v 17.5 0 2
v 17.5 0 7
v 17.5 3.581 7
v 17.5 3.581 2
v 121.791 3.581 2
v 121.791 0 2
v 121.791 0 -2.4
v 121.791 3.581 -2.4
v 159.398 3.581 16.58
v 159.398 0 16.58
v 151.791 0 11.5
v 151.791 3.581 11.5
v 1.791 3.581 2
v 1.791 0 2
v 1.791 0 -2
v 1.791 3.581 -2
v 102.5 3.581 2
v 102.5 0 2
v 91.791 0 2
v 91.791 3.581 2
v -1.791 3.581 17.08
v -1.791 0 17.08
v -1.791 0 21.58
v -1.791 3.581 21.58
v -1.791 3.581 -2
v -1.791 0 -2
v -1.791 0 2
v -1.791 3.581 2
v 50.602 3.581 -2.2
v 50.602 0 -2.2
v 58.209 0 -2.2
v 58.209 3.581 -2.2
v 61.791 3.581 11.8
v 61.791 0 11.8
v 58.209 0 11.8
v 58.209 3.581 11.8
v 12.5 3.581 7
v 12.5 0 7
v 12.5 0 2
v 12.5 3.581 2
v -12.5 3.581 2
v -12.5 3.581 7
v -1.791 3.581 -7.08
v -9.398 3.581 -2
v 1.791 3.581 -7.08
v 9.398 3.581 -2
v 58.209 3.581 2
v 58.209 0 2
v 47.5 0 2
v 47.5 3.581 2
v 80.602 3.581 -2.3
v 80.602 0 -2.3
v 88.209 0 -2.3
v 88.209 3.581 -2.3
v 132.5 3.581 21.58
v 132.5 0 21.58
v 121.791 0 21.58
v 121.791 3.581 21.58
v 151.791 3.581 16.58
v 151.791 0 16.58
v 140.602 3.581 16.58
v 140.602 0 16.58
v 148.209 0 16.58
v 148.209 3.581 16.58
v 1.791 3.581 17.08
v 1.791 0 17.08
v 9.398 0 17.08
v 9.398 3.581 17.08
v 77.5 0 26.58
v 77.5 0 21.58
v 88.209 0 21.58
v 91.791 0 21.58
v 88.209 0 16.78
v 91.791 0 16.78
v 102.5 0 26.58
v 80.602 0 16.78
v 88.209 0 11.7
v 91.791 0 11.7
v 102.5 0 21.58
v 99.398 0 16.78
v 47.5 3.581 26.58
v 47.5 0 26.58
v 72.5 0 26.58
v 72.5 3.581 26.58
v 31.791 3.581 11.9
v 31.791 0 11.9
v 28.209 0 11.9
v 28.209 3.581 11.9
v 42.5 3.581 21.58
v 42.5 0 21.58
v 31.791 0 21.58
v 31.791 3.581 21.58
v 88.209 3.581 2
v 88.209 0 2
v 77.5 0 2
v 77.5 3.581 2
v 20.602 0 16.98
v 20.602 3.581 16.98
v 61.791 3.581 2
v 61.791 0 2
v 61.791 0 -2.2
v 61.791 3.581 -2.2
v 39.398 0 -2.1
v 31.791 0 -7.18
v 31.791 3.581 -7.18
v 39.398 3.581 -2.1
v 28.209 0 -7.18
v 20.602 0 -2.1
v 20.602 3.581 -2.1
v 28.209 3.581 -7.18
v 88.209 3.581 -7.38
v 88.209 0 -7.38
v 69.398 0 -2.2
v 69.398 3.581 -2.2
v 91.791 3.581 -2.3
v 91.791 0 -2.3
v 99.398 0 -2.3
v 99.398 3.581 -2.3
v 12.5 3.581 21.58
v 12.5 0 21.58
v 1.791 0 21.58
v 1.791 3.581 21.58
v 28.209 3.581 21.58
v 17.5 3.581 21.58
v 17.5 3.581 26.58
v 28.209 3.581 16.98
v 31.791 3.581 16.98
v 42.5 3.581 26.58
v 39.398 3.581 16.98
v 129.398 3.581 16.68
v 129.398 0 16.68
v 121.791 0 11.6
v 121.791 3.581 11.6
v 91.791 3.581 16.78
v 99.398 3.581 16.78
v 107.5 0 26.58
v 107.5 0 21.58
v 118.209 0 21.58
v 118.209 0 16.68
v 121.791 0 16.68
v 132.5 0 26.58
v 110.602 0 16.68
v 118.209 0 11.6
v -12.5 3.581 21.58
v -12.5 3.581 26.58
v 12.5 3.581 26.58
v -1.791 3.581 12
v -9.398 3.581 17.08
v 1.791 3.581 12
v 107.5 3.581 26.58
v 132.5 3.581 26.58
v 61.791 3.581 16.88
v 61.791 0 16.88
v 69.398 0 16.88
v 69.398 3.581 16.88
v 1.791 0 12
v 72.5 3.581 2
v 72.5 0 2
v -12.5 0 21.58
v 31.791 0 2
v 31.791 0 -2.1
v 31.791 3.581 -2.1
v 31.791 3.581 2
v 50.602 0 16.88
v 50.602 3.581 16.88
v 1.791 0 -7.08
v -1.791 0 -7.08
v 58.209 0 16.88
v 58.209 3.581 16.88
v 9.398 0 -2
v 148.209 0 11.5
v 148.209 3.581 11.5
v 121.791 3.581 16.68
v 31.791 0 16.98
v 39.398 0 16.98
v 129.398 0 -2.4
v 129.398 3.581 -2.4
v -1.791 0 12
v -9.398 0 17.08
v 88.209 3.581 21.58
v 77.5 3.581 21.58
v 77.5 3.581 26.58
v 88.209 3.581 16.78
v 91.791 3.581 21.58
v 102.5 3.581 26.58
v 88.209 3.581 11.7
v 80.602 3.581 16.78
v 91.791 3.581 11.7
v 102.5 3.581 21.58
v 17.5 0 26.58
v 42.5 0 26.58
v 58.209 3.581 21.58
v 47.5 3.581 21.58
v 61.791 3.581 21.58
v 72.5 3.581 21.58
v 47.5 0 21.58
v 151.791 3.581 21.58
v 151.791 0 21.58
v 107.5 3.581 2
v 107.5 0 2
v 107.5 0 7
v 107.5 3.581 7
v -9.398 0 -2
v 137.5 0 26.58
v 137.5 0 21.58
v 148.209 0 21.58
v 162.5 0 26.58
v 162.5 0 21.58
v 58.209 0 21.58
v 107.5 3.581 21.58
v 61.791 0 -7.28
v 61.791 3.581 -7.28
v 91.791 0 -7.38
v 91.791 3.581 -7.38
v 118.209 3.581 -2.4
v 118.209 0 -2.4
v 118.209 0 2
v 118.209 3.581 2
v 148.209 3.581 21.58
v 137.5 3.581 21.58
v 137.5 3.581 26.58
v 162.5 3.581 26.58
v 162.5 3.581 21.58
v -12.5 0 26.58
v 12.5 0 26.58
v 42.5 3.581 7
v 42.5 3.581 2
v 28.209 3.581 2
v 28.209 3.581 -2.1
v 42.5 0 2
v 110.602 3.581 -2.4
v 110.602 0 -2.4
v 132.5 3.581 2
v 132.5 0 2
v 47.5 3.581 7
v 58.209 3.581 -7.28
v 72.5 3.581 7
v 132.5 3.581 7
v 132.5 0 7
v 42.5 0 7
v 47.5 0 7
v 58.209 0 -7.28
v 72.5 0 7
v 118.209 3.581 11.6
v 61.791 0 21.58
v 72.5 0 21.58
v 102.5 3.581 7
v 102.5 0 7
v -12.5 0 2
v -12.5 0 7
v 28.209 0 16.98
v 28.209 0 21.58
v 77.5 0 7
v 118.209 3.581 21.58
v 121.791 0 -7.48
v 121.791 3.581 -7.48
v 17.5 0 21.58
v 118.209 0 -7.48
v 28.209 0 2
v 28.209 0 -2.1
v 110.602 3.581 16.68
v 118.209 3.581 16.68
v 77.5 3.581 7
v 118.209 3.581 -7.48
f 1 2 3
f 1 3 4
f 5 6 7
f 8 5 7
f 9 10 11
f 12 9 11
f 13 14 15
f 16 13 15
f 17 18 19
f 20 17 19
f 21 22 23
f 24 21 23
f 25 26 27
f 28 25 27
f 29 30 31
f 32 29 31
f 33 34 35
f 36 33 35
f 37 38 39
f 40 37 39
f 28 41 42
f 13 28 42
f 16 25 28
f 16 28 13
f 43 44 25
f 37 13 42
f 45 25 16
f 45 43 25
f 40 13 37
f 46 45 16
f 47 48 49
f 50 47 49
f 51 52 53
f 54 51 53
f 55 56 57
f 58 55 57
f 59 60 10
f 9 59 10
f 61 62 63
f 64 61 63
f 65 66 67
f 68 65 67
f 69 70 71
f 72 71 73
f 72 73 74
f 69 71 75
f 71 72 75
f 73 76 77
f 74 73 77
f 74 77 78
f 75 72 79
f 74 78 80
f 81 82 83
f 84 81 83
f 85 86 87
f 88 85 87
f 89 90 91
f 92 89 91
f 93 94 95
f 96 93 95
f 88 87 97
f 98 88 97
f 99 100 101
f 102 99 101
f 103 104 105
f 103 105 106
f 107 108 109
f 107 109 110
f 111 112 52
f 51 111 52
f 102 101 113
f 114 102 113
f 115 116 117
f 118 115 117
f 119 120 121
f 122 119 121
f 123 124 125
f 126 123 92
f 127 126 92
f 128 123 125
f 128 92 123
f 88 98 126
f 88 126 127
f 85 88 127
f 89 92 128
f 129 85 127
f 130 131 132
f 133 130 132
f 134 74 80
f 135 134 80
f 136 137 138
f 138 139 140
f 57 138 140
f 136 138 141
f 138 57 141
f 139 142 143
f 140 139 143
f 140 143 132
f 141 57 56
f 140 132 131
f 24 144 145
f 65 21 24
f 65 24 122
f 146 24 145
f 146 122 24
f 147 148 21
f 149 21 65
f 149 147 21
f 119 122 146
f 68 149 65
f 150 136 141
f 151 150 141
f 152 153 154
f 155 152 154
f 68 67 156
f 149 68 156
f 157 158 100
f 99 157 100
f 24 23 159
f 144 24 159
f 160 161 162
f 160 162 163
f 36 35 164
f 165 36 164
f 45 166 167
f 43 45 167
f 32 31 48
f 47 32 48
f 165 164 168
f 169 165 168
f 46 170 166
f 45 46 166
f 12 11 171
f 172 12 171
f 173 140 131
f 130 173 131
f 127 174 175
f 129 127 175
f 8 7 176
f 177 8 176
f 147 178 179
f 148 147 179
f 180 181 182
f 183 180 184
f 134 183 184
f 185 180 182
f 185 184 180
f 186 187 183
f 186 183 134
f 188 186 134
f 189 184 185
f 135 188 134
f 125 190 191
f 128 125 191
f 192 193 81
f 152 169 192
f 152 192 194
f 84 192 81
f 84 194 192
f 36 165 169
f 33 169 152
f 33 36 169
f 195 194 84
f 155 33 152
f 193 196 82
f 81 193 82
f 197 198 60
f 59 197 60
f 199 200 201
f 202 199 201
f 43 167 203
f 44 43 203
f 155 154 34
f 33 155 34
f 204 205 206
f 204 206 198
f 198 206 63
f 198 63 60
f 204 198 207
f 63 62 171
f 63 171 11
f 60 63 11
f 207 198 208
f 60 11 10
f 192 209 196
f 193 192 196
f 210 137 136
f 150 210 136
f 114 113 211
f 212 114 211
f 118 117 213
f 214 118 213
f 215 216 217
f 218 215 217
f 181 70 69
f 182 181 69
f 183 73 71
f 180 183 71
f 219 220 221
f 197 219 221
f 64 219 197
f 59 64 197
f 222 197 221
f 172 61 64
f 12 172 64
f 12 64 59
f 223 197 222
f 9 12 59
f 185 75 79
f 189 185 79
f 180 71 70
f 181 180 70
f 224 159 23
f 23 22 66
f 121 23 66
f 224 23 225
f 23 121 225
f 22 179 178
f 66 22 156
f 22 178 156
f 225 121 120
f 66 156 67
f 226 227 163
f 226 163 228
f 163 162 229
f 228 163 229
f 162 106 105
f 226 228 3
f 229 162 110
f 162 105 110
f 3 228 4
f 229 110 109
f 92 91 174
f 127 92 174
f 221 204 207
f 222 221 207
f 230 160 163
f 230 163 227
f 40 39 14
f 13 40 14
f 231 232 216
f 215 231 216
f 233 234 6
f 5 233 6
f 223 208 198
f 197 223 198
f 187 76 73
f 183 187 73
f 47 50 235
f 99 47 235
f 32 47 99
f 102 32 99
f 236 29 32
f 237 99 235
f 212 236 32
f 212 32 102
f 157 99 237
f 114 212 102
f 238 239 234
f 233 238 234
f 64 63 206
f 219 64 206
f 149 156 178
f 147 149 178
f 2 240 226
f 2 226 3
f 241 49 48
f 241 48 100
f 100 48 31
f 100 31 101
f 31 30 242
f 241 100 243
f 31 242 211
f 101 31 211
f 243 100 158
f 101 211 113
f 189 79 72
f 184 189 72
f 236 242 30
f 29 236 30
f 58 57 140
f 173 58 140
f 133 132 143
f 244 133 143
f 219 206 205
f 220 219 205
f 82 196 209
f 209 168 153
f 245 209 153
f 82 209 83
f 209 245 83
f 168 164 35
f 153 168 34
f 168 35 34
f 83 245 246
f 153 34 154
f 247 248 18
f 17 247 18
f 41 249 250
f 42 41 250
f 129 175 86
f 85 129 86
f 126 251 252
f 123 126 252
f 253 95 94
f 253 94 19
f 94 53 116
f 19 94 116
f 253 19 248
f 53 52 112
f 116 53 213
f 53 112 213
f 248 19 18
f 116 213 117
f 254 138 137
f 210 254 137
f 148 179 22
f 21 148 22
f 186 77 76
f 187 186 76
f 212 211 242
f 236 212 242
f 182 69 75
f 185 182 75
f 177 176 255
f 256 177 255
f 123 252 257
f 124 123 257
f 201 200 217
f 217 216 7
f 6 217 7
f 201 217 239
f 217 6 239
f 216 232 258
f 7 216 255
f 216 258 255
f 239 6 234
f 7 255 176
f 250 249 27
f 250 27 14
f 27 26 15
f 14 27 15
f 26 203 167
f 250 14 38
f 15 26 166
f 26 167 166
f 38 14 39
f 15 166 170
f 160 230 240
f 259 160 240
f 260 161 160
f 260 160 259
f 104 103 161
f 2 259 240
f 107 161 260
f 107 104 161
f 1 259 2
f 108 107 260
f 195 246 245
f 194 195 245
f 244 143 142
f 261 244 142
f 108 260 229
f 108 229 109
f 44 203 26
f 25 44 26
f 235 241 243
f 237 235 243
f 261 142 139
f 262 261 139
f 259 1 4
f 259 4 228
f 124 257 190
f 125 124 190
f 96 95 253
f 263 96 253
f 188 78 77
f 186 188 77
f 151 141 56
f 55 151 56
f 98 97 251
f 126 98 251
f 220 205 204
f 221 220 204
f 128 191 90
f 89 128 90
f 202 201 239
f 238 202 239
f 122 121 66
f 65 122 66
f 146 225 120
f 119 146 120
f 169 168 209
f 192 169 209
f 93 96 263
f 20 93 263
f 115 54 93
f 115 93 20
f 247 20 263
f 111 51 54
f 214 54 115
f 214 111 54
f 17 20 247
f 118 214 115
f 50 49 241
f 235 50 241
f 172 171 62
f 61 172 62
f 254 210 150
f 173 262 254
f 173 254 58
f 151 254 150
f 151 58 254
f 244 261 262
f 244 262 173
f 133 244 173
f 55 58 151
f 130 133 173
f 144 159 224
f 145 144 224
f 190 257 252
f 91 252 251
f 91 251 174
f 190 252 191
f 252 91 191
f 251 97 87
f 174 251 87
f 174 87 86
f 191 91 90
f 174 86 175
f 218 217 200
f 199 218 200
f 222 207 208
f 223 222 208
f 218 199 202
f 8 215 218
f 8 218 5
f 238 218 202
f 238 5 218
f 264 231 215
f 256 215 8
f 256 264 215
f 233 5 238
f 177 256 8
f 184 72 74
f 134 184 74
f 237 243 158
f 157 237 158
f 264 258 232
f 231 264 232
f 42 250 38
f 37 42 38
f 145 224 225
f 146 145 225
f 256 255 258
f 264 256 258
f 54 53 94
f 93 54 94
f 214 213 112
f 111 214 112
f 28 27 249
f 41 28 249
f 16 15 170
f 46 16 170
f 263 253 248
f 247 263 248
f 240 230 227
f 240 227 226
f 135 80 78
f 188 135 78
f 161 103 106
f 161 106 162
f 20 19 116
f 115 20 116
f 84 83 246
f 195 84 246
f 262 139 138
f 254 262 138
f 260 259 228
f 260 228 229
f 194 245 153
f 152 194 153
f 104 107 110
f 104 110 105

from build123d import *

# Parameters (mm, degrees)
BOSS_EXTRUDE1_DEPTH = 3.5814
BOSS_EXTRUDE2_DEPTH = 3.5814


with BuildPart() as part:
    # Sketch1 → Boss-Extrude1 (new body)
    with BuildSketch(Plane(origin=(0, 0, 0), x_dir=(1, 0, 0), z_dir=(0, 1, 0))):
        Polygon((-12.5, -7), (12.5, -7), (12.5, -2), (1.7907, -2), (1.7907, 2), (9.398, 2), (1.7907, 7.08), (-1.7907, 7.08), (-9.398, 2), (-1.7907, 2), (-1.7907, -2), (-12.5, -2), align=None)
    extrude(amount=BOSS_EXTRUDE1_DEPTH)


with BuildPart() as body_2:
    # Sketch2 → Boss-Extrude2 (new body)
    with BuildSketch(Plane(origin=(0, 0, 0), x_dir=(1, 0, 0), z_dir=(0, 1, 0))):
        Polygon((17.5, -2), (28.2093, -2), (28.2093, 2.1), (20.602, 2.1), (28.2093, 7.18), (31.7907, 7.18), (39.398, 2.1), (31.7907, 2.1), (31.7907, -2), (42.5, -2), (42.5, -7), (17.5, -7), align=None)
        Polygon((47.5, -7), (72.5, -7), (72.5, -2), (61.7907, -2), (61.7907, 2.2), (69.398, 2.2), (61.7907, 7.28), (58.2093, 7.28), (50.602, 2.2), (58.2093, 2.2), (58.2093, -2), (47.5, -2), align=None)
        Polygon((77.5, -7), (102.5, -7), (102.5, -2), (91.7907, -2), (91.7907, 2.3), (99.398, 2.3), (91.7907, 7.38), (88.2093, 7.38), (80.602, 2.3), (88.2093, 2.3), (88.2093, -2), (77.5, -2), align=None)
        Polygon((107.5, -7), (132.5, -7), (132.5, -2), (121.7907, -2), (121.7907, 2.4), (129.398, 2.4), (121.7907, 7.48), (118.2093, 7.48), (110.602, 2.4), (118.2093, 2.4), (118.2093, -2), (107.5, -2), align=None)
        Polygon((-12.5, -26.58), (12.5, -26.58), (12.5, -21.58), (1.7907, -21.58), (1.7907, -17.08), (9.398, -17.08), (1.7907, -12), (-1.7907, -12), (-9.398, -17.08), (-1.7907, -17.08), (-1.7907, -21.58), (-12.5, -21.58), align=None)
        Polygon((31.7907, -21.58), (28.2093, -21.58), (17.5, -21.58), (17.5, -26.58), (42.5, -26.58), (42.5, -21.58), align=None)
        Polygon((61.7907, -21.58), (58.2093, -21.58), (47.5, -21.58), (47.5, -26.58), (72.5, -26.58), (72.5, -21.58), align=None)
        Polygon((20.602, -16.98), (28.2093, -16.98), (28.2093, -21.58), (31.7907, -21.58), (31.7907, -16.98), (39.398, -16.98), (31.7907, -11.9), (28.2093, -11.9), align=None)
        Polygon((50.602, -16.88), (58.2093, -16.88), (58.2093, -21.58), (61.7907, -21.58), (61.7907, -16.88), (69.398, -16.88), (61.7907, -11.8), (58.2093, -11.8), align=None)
        Polygon((77.5, -26.58), (102.5, -26.58), (102.5, -21.58), (91.7907, -21.58), (91.7907, -16.78), (99.398, -16.78), (91.7907, -11.7), (88.2093, -11.7), (80.602, -16.78), (88.2093, -16.78), (88.2093, -21.58), (77.5, -21.58), align=None)
        Polygon((107.5, -26.58), (132.5, -26.58), (132.5, -21.58), (121.7907, -21.58), (121.7907, -16.68), (129.398, -16.68), (121.7907, -11.6), (118.2093, -11.6), (110.602, -16.68), (118.2093, -16.68), (118.2093, -21.58), (107.5, -21.58), align=None)
        Polygon((137.5, -26.58), (162.5, -26.58), (162.5, -21.58), (151.7907, -21.58), (151.7907, -16.58), (159.398, -16.58), (151.7907, -11.5), (148.2093, -11.5), (140.602, -16.58), (148.2093, -16.58), (148.2093, -21.58), (137.5, -21.58), align=None)
    extrude(amount=BOSS_EXTRUDE2_DEPTH)


solid = Compound([part.part, body_2.part])
